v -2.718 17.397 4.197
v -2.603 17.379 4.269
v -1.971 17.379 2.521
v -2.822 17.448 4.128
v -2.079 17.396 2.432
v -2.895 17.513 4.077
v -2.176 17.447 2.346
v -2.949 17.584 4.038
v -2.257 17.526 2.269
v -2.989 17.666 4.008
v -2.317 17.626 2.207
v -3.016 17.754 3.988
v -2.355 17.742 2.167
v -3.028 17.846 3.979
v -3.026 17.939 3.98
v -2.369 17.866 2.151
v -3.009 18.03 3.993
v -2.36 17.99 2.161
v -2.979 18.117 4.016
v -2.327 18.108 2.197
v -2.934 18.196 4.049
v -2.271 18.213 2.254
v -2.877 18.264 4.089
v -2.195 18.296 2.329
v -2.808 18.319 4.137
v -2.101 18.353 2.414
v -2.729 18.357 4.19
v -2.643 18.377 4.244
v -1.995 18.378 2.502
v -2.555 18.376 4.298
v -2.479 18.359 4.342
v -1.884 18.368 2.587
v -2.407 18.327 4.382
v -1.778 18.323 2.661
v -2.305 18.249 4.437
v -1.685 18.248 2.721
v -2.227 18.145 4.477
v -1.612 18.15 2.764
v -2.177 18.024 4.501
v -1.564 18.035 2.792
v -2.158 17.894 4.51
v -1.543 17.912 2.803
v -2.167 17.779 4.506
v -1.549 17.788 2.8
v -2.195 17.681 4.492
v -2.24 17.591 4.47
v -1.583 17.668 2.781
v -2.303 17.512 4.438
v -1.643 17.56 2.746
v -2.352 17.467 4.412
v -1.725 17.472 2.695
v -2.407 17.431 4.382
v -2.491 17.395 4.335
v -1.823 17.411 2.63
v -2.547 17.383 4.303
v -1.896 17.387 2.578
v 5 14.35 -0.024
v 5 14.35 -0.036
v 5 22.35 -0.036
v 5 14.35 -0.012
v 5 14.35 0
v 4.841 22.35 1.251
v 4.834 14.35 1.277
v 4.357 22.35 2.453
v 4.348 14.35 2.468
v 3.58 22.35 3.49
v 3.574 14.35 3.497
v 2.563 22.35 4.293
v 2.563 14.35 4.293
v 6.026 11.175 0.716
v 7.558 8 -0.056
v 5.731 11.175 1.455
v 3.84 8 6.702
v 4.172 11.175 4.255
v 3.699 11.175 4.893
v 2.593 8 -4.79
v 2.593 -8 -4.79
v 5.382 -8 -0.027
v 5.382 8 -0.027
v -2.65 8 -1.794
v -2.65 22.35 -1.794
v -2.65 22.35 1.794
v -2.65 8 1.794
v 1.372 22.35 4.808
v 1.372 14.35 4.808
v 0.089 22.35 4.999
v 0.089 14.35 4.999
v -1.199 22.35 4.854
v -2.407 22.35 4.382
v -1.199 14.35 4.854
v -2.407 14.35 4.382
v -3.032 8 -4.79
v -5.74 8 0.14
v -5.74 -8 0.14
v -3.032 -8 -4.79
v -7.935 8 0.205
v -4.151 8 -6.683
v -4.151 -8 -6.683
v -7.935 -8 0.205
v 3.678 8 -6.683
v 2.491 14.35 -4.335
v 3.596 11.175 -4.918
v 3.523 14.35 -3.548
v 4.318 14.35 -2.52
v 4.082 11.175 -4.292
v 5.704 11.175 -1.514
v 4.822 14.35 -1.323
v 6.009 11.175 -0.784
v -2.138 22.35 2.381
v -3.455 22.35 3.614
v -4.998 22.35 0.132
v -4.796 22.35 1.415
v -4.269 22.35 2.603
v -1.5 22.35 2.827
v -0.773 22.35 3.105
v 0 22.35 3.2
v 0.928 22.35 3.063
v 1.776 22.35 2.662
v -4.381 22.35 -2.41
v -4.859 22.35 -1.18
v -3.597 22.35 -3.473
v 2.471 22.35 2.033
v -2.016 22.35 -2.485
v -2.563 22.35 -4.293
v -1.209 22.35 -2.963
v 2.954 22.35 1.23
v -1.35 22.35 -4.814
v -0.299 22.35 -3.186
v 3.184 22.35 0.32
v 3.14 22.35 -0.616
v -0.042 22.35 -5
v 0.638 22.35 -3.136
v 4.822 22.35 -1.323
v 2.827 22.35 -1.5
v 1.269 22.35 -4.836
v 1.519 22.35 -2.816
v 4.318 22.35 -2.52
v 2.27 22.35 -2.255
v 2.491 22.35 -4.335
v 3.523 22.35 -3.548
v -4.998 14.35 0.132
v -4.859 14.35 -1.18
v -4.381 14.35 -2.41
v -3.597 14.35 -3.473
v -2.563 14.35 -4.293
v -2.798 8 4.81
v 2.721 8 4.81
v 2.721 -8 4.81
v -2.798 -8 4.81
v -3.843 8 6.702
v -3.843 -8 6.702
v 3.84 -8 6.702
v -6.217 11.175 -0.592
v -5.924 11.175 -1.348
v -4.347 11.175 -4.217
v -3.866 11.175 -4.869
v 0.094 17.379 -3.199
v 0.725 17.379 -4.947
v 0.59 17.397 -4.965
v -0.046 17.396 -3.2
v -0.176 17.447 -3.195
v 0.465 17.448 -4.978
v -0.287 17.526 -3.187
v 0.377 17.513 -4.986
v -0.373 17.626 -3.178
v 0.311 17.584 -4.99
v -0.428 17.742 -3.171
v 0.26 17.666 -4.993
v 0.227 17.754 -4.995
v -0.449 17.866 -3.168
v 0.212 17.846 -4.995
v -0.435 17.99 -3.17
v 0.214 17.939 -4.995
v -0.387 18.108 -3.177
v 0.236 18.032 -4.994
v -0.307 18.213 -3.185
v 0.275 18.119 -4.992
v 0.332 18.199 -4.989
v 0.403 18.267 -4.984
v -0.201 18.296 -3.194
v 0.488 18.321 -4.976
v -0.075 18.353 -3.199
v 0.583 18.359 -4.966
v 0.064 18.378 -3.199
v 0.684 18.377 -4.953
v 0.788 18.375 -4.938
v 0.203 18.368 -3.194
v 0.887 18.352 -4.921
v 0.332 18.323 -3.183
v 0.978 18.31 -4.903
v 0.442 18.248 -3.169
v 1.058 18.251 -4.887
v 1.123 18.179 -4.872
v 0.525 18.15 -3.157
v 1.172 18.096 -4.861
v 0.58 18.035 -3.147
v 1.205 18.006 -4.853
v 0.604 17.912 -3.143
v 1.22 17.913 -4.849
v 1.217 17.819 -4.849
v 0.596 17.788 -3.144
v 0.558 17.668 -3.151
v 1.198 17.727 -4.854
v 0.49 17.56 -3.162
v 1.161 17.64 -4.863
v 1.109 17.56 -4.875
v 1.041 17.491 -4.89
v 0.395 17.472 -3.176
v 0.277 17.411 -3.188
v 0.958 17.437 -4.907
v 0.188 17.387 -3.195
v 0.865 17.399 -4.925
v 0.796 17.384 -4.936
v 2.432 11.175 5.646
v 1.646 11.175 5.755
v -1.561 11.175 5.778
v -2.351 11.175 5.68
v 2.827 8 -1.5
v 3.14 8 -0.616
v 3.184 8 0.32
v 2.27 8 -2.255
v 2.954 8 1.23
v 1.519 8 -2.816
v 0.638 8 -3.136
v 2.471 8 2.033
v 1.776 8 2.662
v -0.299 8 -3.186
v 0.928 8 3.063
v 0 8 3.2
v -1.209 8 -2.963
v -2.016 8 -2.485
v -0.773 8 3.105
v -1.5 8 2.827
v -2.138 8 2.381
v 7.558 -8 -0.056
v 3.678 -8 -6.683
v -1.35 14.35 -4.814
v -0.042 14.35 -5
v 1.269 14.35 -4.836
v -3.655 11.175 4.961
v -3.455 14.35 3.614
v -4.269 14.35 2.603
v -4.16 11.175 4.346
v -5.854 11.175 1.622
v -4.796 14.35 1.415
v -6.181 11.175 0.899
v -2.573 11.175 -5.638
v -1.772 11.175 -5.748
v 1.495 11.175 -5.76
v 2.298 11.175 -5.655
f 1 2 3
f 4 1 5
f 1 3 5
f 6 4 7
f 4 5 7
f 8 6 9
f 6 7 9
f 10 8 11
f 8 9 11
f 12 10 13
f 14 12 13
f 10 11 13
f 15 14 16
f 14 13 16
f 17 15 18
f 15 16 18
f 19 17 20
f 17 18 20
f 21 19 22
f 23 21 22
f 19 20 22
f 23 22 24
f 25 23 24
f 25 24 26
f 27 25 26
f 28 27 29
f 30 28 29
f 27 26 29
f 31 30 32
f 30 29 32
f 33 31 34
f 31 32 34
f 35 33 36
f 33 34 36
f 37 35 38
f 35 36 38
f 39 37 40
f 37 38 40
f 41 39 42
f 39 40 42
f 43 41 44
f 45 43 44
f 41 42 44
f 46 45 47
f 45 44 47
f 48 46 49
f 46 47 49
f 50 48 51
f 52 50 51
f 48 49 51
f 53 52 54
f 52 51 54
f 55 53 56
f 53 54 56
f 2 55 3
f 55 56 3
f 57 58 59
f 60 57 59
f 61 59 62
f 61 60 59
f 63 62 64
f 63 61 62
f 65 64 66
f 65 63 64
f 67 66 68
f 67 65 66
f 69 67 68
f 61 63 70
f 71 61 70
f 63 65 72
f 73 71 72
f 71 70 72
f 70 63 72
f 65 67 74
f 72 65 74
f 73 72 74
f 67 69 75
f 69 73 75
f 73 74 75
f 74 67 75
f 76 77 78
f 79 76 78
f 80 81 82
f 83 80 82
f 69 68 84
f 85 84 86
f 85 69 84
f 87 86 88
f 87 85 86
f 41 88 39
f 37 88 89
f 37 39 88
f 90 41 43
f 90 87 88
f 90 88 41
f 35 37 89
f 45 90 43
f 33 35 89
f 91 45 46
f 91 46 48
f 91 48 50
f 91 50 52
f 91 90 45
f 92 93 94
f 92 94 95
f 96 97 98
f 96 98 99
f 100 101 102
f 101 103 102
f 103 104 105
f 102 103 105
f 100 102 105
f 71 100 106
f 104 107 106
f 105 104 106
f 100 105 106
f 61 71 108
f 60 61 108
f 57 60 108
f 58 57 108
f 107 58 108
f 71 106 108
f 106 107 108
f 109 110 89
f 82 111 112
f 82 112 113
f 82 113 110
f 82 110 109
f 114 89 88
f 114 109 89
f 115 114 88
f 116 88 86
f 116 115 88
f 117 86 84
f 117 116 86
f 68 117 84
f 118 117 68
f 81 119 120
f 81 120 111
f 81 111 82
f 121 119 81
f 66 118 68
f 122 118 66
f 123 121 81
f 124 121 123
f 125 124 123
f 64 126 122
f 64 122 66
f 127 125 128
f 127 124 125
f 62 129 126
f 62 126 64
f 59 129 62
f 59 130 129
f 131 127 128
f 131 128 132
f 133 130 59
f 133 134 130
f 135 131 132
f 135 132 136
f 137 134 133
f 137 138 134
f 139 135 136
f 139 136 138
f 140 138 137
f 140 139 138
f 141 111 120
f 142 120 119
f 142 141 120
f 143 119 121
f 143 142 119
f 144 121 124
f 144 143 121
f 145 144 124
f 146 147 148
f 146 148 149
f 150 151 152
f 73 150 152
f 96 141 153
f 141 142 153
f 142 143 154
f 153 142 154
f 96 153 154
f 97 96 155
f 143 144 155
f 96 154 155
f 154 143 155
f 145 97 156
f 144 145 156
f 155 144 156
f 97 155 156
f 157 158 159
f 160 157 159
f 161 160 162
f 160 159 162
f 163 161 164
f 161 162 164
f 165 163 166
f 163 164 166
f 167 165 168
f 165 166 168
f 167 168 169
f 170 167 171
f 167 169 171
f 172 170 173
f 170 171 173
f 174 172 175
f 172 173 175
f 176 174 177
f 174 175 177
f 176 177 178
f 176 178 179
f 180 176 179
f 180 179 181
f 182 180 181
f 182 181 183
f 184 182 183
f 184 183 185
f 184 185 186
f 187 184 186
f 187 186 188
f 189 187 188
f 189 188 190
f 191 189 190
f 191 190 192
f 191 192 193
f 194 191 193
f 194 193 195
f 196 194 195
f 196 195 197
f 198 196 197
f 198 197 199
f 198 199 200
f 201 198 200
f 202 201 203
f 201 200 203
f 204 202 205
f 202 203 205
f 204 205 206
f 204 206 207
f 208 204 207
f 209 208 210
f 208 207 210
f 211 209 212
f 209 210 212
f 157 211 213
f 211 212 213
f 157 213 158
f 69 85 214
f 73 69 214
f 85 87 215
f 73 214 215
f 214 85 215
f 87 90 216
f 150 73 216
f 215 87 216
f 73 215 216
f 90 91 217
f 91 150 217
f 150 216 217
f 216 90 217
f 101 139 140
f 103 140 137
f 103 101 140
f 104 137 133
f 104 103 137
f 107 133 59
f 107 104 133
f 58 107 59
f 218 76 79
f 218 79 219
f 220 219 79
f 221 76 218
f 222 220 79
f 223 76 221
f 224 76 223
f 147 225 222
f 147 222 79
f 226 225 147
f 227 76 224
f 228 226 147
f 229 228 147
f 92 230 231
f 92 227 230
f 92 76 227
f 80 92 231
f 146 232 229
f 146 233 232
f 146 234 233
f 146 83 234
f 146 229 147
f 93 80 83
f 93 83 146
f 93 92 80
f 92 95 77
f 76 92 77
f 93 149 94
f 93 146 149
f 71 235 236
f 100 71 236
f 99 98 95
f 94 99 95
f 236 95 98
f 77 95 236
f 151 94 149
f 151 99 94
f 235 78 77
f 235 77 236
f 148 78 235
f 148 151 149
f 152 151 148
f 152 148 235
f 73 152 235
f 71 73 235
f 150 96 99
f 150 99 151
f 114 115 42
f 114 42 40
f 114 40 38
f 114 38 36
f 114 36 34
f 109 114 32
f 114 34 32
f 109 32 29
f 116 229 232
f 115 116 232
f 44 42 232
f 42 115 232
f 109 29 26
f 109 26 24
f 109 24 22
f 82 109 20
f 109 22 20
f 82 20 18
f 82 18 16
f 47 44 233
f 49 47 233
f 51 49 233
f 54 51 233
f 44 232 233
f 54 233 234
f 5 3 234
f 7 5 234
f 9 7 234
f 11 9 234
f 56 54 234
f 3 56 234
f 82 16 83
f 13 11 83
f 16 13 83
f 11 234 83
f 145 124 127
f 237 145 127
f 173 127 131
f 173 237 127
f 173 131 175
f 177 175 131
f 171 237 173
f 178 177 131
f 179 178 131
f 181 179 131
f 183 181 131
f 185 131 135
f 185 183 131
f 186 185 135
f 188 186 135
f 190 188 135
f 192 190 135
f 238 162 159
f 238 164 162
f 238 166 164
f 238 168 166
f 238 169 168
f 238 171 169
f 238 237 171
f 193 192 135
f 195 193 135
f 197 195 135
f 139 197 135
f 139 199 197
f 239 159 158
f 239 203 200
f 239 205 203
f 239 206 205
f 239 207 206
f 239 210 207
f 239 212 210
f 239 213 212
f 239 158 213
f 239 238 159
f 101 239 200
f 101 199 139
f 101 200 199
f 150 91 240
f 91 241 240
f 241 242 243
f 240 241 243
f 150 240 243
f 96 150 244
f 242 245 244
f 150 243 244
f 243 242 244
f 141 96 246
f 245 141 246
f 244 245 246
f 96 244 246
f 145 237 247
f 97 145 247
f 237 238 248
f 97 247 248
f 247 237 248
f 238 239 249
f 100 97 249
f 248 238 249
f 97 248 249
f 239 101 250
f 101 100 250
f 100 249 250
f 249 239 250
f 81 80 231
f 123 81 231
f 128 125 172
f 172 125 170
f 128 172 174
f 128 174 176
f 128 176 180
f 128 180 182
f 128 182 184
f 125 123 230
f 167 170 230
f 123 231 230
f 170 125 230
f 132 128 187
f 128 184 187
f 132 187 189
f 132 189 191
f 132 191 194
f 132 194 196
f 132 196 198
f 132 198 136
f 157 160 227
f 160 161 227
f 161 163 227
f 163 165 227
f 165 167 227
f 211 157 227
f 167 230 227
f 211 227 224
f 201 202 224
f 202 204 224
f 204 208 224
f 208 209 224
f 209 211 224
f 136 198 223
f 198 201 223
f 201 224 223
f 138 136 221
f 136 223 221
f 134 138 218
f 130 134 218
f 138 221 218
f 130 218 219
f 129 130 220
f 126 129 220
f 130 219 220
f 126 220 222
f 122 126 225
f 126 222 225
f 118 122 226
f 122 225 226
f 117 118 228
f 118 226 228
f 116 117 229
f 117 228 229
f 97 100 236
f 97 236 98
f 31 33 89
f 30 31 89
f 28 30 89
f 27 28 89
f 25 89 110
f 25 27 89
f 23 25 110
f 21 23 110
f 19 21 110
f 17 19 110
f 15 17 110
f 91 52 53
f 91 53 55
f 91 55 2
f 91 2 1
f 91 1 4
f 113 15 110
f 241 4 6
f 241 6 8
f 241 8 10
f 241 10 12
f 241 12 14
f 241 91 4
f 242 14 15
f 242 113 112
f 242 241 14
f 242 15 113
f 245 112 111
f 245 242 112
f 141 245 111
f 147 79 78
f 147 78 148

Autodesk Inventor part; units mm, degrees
ref_plane "YZ Plane" through (0, 0, 0) normal (1, 0, 0) x (0, 1, 0)
ref_plane "XZ Plane" through (0, 0, 0) normal (0, 1, 0) x (-1, 0, 0)
ref_plane "XY Plane" through (0, 0, 0) normal (0, 0, 1) x (1, 0, 0)
sketch "Sketch1" plane through (0, 0, 0) normal (0, 1, 0) x (-1, 0, 0)
  line L0 (3.0315, -4.7903) -> (-2.5932, -4.7903)
  line L1 (-2.5932, -4.7903) -> (-5.3821, -0.0266)
  line L2 (-5.3821, -0.0266) -> (-2.721, 4.8097)
  line L3 (-2.721, 4.8097) -> (2.7981, 4.8097)
  line L4 (2.7981, 4.8097) -> (5.7396, 0.1397)
  line L5 (5.7396, 0.1397) -> (3.0315, -4.7903)
  line L6 (-7.5579, -0.0555) -> (-3.6782, -6.6826)
  line L7 (-3.6782, -6.6826) -> (4.1511, -6.6826)
  line L8 (4.1511, -6.6826) -> (7.9347, 0.2053)
  line L9 (7.9347, 0.2053) -> (3.8427, 6.7021)
  line L10 (3.8427, 6.7021) -> (-3.8397, 6.7021)
  line L11 (-3.8397, 6.7021) -> (-7.5579, -0.0555)
  line L12 (0.004, -1.2887) -> (0.004, -3.3542)
  dimension "d43" = 9.6
ref_plane "Work Plane1" through (0, 14.35, 0) normal (0, 1, 0) x (1, 0, 0)
sketch "Sketch3" plane through (0, 14.35, 0) normal (0, 1, 0) x (1, 0, 0)
  circle A0 centre (0, 0) radius 5
  dimension "d7" = 10
extrude "Extrusion3" add sketch "Sketch1" along normal blind 8
sketch "Sketch6" plane through (0, 8, 0) normal (0, 1, 0) x (1, 0, 0)
  line L0 (3.6782, 6.6826) -> (-4.1511, 6.6826) projected
  line L1 (-4.1511, 6.6826) -> (-7.9347, -0.2053) projected
  line L2 (-7.9347, -0.2053) -> (-3.8427, -6.7021) projected
  line L3 (-3.8427, -6.7021) -> (3.8397, -6.7021) projected
  line L4 (3.8397, -6.7021) -> (7.5579, 0.0555) projected
  line L5 (7.5579, 0.0555) -> (3.6782, 6.6826) projected
  line L6 (-3.0315, 4.7903) -> (2.5932, 4.7903) projected
  line L7 (2.5932, 4.7903) -> (5.3821, 0.0266) projected
  line L8 (5.3821, 0.0266) -> (2.721, -4.8097) projected
  line L9 (2.721, -4.8097) -> (-2.7981, -4.8097) projected
  line L10 (-2.7981, -4.8097) -> (-5.7396, -0.1397) projected
  line L11 (-5.7396, -0.1397) -> (-3.0315, 4.7903) projected
  point P0 (0, 0)
loft "Loft2" add profiles "Sketch3" section 1 edges at (-0.2365, 8, -6.6826) (-6.0429, 8, -3.2387) (-5.8887, 8, 3.4537) (-0.0015, 8, 6.7021) (5.6988, 8, 3.3233) (5.618, 8, -3.3691)
sketch "Sketch7" plane through (0, 14.35, 0) normal (0, 1, 0) x (0.9999645, 0, -0.0084267)
  arc A0 (2.5271, 4.3143) -> (-2.5271, 4.3143) centre (0, 0) ccw projected
  arc A1 (-2.5271, 4.3143) -> (-4.9992, -0.09) centre (0, 0) ccw projected
  arc A2 (-4.9992, -0.09) -> (-2.4442, -4.3618) centre (0, 0) ccw projected
  arc A3 (-2.4442, -4.3618) -> (2.5264, -4.3148) centre (0, 0) ccw projected
  arc A4 (2.5264, -4.3148) -> (5, -0.0063) centre (0, 0) ccw projected
  arc A5 (5, -0.0063) -> (2.5271, 4.3143) centre (0, 0) ccw projected
  point P0 (0, 0)
sketch "Sketch8" plane through (0, 0, 0) normal (0, -1, 0) x (1, 0, 0)
  line L0 (3.6782, -6.6826) -> (-4.1511, -6.6826) projected
  line L1 (7.5579, -0.0555) -> (3.6782, -6.6826) projected
  line L2 (3.8397, 6.7021) -> (7.5579, -0.0555) projected
  line L3 (-3.8427, 6.7021) -> (3.8397, 6.7021) projected
  line L4 (-7.9347, 0.2053) -> (-3.8427, 6.7021) projected
  line L5 (-4.1511, -6.6826) -> (-7.9347, 0.2053) projected
  line L6 (-3.0315, -4.7903) -> (2.5932, -4.7903) projected
  line L7 (-5.7396, 0.1397) -> (-3.0315, -4.7903) projected
  line L8 (-2.7981, 4.8097) -> (-5.7396, 0.1397) projected
  line L9 (2.721, 4.8097) -> (-2.7981, 4.8097) projected
  line L10 (5.3821, -0.0266) -> (2.721, 4.8097) projected
  line L11 (2.5932, -4.7903) -> (5.3821, -0.0266) projected
  point P0 (0, 0)
extrude "Extrusion4" add sketch "Sketch8" along normal blind 8
extrude "Extrusion5" add sketch "Sketch7" along normal blind 8
sketch "Sketch9" plane through (0, 22.35, 0) normal (0, 1, 0) x (1, 0, 0)
  point P0 (0, 0)
  point P1 (0, 0)
hole "Hole2" at (0, 22.35, 0) direction (0, -1, 0) diameter 6.4 end through all
ref_plane "Work Plane5" through (3.8397, 0, 6.7021) normal (-0.3395675, 0, 0.9405817) x (0, -1, 0)
sketch "Sketch10" plane through (3.8397, 0, 6.7021) normal (-0.3395675, 0, 0.9405817) x (0, -1, 0)
  point P0 (0, -5.8873)
  point P1 (-17.8788, -6.8855)
hole "Hole3" at (-2.6367, 17.8788, 4.3639) direction (0.3395675, 0, -0.9405817) diameter 1 end through all
sketch "Sketch11" plane through (0, 22.35, 0) normal (0, 1, 0) x (1, 0, 0)
  line L0 (-2.65, 7.87) -> (-2.65, -12.0471)
  circle A0 centre (0, 0) radius 3.2 projected
  line L1 (3.05, 2.2452) -> (3.05, -2.0886)
  point P0 (0, 0)
  point P1 (-2.65, -1.7937)
  point P2 (-2.65, 1.7937)
  dimension "d52" = 3.05
  dimension "d53" = 5.7
extrude "Extrusion6" add sketch "Sketch11" against normal up to surface (14.35 mm away) contours L0 A0
properties part number "motorattacher"
